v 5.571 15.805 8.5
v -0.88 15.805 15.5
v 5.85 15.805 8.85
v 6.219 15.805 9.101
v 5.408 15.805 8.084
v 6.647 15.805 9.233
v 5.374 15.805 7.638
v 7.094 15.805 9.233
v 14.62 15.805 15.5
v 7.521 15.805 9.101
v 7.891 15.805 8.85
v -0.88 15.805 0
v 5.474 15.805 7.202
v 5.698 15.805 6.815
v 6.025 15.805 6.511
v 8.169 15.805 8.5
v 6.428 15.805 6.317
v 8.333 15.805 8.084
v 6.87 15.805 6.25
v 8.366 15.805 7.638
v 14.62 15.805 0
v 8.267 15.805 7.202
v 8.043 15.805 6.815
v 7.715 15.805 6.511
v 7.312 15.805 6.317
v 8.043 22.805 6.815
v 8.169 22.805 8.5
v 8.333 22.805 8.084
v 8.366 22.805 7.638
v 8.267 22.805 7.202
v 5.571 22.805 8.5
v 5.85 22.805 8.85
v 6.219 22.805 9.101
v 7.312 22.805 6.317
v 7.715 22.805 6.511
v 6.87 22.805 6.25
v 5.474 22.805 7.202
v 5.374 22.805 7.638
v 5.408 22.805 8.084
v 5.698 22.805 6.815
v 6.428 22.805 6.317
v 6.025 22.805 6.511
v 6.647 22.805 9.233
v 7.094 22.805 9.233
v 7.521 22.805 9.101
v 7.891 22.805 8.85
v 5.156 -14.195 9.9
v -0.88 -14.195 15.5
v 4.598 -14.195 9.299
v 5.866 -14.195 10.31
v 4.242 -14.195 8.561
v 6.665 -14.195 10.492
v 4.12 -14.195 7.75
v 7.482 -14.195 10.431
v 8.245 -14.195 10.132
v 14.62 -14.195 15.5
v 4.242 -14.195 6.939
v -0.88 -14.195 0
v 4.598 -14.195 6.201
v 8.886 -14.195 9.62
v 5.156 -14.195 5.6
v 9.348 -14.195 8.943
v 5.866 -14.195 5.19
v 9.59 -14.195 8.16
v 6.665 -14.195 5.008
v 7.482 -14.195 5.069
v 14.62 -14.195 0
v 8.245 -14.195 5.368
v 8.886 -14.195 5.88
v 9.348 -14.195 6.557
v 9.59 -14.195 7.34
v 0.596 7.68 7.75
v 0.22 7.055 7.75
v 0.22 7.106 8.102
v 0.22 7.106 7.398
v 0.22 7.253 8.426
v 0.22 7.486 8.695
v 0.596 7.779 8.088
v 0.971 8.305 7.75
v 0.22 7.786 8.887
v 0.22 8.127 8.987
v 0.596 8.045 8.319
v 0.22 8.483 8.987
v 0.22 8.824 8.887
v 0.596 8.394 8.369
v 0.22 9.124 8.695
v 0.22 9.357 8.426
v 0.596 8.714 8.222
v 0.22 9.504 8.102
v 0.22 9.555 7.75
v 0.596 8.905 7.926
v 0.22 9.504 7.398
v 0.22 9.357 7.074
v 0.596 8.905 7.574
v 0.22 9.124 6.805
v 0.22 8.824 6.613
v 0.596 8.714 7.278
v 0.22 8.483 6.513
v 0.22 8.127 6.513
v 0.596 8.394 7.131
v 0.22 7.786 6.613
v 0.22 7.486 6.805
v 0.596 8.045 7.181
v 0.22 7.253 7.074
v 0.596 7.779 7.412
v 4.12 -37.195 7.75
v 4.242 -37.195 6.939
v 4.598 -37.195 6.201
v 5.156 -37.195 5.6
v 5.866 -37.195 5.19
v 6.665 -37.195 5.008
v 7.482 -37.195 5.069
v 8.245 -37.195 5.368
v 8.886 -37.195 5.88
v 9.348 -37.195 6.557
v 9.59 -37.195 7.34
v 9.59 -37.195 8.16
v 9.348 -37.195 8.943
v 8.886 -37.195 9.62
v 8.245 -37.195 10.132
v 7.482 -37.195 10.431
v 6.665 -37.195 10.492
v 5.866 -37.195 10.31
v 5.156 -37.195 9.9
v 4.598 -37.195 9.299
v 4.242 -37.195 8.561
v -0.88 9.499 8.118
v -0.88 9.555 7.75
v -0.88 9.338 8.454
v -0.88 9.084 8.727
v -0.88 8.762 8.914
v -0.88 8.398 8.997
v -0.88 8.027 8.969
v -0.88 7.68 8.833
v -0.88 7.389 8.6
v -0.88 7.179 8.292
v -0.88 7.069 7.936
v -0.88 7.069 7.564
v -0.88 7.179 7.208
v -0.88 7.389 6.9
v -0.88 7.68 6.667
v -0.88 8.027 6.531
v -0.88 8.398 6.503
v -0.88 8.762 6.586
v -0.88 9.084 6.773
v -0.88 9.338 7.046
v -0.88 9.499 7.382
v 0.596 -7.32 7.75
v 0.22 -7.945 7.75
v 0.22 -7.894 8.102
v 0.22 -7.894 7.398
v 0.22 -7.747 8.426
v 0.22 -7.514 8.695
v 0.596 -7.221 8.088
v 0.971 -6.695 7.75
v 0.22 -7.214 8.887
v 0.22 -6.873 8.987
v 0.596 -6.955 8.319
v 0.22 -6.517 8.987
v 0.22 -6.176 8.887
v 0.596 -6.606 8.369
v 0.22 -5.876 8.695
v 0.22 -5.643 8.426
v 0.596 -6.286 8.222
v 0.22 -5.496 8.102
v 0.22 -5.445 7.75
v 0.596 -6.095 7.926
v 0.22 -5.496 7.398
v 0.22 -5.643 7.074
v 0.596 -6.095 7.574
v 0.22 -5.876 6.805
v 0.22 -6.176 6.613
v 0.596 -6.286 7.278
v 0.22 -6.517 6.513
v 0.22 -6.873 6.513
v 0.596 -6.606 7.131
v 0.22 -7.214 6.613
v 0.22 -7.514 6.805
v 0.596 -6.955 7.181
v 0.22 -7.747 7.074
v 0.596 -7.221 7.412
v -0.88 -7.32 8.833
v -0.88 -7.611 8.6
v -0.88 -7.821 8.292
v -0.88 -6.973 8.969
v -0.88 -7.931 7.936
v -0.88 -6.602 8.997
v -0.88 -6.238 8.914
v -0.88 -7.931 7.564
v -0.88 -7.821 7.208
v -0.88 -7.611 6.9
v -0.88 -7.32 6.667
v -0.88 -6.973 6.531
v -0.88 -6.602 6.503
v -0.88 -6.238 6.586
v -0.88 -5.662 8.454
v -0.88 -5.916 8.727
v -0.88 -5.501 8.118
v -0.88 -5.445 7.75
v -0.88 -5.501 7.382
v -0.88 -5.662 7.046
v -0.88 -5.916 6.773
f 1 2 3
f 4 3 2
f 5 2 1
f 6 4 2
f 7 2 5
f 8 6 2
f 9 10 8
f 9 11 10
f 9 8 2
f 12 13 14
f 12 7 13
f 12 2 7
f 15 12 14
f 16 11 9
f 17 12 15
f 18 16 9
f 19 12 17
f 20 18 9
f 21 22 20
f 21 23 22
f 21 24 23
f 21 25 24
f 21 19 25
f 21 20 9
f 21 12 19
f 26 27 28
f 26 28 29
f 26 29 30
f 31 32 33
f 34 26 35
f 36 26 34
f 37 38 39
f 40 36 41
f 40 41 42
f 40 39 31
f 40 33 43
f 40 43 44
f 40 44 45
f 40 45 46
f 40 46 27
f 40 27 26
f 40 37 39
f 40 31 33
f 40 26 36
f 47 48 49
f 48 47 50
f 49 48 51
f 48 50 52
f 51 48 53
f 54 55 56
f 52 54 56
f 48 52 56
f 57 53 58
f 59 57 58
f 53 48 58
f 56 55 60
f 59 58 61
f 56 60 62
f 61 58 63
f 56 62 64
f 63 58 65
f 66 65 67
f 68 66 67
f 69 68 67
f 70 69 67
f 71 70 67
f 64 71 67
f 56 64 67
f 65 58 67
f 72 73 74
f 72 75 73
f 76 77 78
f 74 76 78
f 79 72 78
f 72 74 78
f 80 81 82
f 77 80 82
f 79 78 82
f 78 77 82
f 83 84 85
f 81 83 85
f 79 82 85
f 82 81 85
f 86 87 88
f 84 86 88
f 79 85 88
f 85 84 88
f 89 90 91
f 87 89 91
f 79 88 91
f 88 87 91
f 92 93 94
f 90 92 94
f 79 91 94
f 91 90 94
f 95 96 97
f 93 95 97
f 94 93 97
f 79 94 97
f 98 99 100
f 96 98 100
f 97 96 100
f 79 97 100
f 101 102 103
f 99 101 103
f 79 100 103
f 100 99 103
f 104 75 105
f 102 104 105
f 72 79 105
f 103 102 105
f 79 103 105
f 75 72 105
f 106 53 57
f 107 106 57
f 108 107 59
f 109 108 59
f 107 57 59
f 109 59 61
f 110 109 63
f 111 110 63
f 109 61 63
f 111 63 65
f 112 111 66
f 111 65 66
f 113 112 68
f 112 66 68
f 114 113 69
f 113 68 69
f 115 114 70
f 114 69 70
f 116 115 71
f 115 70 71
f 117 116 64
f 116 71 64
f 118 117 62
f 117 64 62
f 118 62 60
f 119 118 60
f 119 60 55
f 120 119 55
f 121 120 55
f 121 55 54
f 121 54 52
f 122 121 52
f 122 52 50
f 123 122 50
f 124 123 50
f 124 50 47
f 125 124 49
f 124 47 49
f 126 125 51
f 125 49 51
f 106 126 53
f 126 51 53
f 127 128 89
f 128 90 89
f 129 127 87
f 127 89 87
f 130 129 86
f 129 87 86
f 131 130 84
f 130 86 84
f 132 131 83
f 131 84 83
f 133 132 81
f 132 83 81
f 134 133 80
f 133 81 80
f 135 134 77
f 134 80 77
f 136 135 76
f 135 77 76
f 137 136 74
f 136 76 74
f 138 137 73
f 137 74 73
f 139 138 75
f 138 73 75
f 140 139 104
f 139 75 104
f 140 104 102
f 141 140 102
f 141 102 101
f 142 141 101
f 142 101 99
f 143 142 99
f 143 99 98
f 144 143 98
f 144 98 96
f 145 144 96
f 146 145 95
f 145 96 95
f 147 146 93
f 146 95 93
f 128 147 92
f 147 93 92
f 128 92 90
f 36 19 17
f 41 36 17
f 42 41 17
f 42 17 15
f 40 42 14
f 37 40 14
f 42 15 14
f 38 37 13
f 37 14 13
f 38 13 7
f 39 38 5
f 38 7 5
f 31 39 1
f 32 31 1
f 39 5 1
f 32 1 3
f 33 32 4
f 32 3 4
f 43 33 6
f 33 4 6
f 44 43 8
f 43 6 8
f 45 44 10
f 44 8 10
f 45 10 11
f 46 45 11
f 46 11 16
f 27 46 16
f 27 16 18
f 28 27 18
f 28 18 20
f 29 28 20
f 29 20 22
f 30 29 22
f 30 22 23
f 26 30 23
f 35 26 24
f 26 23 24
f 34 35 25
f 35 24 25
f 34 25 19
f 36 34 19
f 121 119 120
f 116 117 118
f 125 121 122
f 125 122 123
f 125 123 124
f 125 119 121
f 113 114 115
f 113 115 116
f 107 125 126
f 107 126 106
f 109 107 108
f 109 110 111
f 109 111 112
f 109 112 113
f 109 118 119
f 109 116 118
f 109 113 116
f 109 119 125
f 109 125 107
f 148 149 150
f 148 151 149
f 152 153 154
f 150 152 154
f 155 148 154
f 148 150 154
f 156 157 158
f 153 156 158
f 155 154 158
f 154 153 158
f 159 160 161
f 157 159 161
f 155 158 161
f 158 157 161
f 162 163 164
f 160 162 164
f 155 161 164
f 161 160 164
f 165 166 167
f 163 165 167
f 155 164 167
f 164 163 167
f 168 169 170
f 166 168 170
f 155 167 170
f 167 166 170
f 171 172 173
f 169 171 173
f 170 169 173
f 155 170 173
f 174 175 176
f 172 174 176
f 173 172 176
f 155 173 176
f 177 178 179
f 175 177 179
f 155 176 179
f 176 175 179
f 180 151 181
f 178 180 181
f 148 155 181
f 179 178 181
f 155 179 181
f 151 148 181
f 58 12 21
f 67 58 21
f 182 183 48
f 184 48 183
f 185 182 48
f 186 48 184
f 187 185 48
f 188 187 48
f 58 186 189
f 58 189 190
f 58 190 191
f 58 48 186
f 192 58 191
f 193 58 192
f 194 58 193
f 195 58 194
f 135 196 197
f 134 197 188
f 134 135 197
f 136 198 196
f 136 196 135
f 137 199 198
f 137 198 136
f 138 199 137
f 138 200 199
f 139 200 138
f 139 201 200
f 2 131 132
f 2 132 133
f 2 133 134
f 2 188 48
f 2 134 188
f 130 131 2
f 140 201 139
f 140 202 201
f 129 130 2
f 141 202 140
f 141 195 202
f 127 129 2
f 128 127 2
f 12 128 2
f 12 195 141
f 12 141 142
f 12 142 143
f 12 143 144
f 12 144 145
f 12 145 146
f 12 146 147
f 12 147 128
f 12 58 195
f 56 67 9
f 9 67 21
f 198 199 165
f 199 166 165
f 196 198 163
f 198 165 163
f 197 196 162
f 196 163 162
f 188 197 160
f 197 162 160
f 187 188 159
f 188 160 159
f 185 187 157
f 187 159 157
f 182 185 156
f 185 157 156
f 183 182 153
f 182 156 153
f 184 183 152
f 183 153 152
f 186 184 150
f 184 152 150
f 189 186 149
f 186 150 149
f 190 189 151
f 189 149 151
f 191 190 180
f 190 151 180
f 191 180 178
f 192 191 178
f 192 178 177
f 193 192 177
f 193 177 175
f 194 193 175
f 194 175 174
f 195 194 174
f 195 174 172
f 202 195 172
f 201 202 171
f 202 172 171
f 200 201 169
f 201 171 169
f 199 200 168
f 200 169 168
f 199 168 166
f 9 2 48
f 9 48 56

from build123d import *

# Parameters (mm, degrees)
ESBO_O2_W                                   = 15.5
ESBO_O2_H                                   = 30
RESSALTO_EXTRUS_O1_DEPTH                    = 15.5
ESBO_O3_R                                   = 1.5
RESSALTO_EXTRUS_O2_DEPTH                    = 7
ESBO_O4_R                                   = 2.75
RESSALTO_EXTRUS_O3_DEPTH                    = 23
BROCA_DE_ROSQUEAR_PARA_TARRAXA_DE_M31_D     = 2.5
BROCA_DE_ROSQUEAR_PARA_TARRAXA_DE_M31_DEPTH = 1.1
BROCA_DE_ROSQUEAR_PARA_TARRAXA_DE_M31_TIP   = 0.751075774


with BuildPart() as part:
    # Esboço2 → Ressalto-extrusão1 (new body)
    with BuildSketch(Plane.XY):
        with Locations((6.870290308, 0.804951604)):
            Rectangle(ESBO_O2_W, ESBO_O2_H)
    extrude(amount=RESSALTO_EXTRUS_O1_DEPTH)

    # Esboço3 → Ressalto-extrusão2 (add)
    with BuildSketch(Plane(origin=(0, 15.804951604, 0), x_dir=(1, 0, 0), z_dir=(0, 1, 0))):
        with Locations(Location((6.870290308, -7.75, 0), (0, 0, 90))):
            Circle(ESBO_O3_R)
    extrude(amount=RESSALTO_EXTRUS_O2_DEPTH)

    # Esboço4 → Ressalto-extrusão3 (add)
    with BuildSketch(Plane.XZ.offset(14.195048396)):
        with Locations(Location((6.870290308, 7.75, 0), (0, 0, 180))):
            Circle(ESBO_O4_R)
    extrude(amount=RESSALTO_EXTRUS_O3_DEPTH)

    # Broca de rosquear para tarraxa de M31
    with Locations(Plane(origin=(-0.879709692, 8.304951604, 7.75), x_dir=(0, -1, 0), z_dir=(-1, 0, 0))):
        with Locations((0, 0), (15, 0)):
            Hole(BROCA_DE_ROSQUEAR_PARA_TARRAXA_DE_M31_D / 2, depth=BROCA_DE_ROSQUEAR_PARA_TARRAXA_DE_M31_DEPTH)
            with Locations((0, 0, -(BROCA_DE_ROSQUEAR_PARA_TARRAXA_DE_M31_DEPTH + BROCA_DE_ROSQUEAR_PARA_TARRAXA_DE_M31_TIP / 2))):  # 118° drill point
                Cone(0, BROCA_DE_ROSQUEAR_PARA_TARRAXA_DE_M31_D / 2, BROCA_DE_ROSQUEAR_PARA_TARRAXA_DE_M31_TIP, mode=Mode.SUBTRACT)


solid = part.part
